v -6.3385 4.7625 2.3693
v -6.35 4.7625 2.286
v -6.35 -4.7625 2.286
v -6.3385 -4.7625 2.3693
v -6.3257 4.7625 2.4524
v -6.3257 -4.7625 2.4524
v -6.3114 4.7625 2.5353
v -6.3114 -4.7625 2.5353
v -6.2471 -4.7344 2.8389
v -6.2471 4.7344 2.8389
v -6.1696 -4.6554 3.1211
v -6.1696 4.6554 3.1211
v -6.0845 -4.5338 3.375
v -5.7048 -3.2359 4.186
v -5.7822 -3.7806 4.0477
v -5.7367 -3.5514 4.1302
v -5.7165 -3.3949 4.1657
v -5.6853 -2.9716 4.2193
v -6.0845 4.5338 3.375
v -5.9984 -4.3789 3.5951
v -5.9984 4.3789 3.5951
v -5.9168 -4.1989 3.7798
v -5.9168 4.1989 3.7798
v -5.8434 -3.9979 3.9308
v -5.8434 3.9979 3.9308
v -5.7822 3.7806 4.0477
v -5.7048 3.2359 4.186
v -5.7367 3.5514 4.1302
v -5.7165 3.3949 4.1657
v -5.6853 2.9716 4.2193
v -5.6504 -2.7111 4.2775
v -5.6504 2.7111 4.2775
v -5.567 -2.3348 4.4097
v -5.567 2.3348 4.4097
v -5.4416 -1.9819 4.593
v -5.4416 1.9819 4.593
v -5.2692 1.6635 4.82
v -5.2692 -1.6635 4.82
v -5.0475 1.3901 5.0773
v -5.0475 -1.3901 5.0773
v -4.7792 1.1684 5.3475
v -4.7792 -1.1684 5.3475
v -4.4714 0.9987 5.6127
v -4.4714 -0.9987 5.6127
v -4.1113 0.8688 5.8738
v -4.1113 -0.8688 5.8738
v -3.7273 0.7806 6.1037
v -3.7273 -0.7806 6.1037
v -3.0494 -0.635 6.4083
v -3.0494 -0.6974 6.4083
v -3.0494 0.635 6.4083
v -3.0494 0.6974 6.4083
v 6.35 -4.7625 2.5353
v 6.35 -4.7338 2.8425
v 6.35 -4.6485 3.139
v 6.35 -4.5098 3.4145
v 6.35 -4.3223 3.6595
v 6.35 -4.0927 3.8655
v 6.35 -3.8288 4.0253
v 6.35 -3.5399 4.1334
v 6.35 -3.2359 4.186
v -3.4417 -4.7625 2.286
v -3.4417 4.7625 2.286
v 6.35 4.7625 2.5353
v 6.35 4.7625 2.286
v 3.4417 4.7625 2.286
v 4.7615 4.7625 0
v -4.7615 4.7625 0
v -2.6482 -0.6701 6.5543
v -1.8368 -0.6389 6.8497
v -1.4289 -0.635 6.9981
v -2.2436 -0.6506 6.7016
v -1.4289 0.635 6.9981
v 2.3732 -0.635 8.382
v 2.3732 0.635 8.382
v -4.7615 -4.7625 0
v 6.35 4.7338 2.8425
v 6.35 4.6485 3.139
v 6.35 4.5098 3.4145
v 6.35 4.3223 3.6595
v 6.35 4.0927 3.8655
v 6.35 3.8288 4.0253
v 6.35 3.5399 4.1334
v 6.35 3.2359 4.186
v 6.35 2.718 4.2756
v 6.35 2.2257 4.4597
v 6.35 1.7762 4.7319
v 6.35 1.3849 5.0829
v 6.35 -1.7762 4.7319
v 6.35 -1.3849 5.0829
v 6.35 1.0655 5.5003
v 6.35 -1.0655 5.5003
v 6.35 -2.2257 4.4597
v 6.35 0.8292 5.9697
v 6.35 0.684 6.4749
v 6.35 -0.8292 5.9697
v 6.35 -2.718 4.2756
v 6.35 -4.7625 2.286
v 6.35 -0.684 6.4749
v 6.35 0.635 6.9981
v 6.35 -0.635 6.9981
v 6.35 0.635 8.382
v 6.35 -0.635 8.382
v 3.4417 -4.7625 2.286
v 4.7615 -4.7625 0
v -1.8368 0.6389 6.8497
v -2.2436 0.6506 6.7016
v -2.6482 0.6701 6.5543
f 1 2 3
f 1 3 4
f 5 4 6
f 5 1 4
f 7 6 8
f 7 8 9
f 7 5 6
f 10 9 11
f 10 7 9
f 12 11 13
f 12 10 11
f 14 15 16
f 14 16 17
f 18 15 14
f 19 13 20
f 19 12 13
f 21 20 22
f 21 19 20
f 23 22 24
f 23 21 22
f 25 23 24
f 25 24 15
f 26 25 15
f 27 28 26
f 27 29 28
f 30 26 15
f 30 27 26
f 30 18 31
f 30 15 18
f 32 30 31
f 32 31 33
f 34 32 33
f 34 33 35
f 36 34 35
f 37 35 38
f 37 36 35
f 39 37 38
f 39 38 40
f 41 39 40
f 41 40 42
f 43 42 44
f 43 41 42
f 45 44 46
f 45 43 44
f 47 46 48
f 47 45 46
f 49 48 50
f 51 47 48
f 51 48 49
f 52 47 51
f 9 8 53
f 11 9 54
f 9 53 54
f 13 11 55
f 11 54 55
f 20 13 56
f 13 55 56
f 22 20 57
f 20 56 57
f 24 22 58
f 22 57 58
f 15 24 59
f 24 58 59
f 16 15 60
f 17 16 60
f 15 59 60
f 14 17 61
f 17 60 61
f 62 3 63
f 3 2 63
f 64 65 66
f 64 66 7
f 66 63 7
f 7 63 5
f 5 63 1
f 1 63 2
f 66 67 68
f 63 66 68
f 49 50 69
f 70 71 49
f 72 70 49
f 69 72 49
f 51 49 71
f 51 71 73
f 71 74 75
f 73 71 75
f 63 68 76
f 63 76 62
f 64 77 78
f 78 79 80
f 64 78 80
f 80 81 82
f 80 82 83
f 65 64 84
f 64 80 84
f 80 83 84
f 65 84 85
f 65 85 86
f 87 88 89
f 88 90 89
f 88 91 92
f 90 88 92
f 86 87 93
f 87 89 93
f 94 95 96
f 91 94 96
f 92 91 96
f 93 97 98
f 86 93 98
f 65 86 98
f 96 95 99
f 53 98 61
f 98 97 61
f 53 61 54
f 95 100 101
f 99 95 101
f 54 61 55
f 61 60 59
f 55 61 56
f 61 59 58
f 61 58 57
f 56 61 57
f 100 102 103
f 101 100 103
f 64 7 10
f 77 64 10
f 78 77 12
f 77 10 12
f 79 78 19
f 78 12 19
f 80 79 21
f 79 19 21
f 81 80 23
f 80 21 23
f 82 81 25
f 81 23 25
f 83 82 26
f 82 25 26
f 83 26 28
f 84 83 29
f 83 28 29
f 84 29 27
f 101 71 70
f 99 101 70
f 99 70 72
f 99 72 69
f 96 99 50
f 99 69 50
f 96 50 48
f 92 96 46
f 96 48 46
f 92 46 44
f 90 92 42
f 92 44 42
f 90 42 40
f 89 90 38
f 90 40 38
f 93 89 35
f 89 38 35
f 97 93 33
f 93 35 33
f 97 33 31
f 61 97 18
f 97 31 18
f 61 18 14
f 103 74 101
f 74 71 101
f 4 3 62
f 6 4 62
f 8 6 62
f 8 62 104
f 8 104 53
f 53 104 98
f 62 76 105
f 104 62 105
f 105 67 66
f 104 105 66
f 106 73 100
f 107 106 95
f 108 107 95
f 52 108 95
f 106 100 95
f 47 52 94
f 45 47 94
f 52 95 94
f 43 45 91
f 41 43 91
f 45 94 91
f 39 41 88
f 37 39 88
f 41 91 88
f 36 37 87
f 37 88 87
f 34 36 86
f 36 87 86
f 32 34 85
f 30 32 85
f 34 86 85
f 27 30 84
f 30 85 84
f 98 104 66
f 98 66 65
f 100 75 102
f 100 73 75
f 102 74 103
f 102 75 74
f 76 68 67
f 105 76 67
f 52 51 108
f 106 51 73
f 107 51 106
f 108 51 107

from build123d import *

# Parameters (mm, degrees)
F0_W         = 9.525
F0_H         = 9.525
F1_DEPTH     = 2.286
F2_T1_DEPTH  = 21.3619144247
F3_W         = 2.9083
F3_H         = 9.525
F3_W_2       = 6.8834
F4_DEPTH     = 1.905
F5_R         = 1.6556676611
F6_W         = 12.7
F6_H         = 1.27
F7_DEPTH     = 4.191
F8_SIZE2     = 8.7232408068
F8_SIZE      = 3.175
F9_T4_DEPTH  = 12.7
F9_T9_DEPTH  = 12.7
F10_T1_DEPTH = 20.1155023365


# Not quite as in the source:
# - a fillet or chamfer that OpenCascade refuses, or shapes differently, is made with other operations: its cross-section is extruded or revolved along the edge and cut away or added


with BuildPart() as f1:
    # F0 (on Top) → F1 (new body)
    with BuildSketch(Plane.XY):
        Rectangle(F0_W, F0_H)
    extrude(amount=F1_DEPTH)

    # F2: chamfer of 1.3208 x 2.2876927066 on 2 edges, made by hand

    # F2_s2 → F2_t1 (cut)
    with BuildSketch(Plane.XZ.offset(-10.6809572123)):
        Polygon((-4.7625, -0.0016927066), (-3.4417, 2.286), (-4.7625, 2.286), align=None)
        Polygon((4.7625, -0.0016927066), (3.4417, 2.286), (4.7625, 2.286), align=None)
    extrude(amount=F2_T1_DEPTH, mode=Mode.SUBTRACT)

    # F3 (on face) → F4 (join)
    with BuildSketch(Plane.XY.offset(2.286)):
        with Locations((4.89585, 0)):
            Rectangle(F3_W, F3_H)
        Rectangle(F3_W_2, F3_H)
        with Locations((-4.89585, 0)):
            Rectangle(F3_W, F3_H)
    extrude(amount=F4_DEPTH)

    # F5
    f5_edges = [f1.edges().sort_by_distance(p)[0] for p in [
        (0, 4.7625, 4.191),
        (0, -4.7625, 4.191),
    ]]
    fillet(f5_edges, radius=F5_R)

    # F6 (on face) → F7 (join)
    with BuildSketch(Plane.XY.offset(4.191)):
        Rectangle(F6_W, F6_H)
    extrude(amount=F7_DEPTH)

    # F8
    f8_edges = [f1.edges().sort_by_distance(p)[0] for p in [
        (-6.35, 0, 8.382),
    ]]
    f8_side = f1.faces().sort_by_distance((-6.35, 0, 3.935532))[0]
    chamfer(f8_edges, length=F8_SIZE, length2=F8_SIZE2, reference=f8_side)

    # F9: fillet of radius 2.8207671263 on 2 edges, made by hand


with BuildPart() as f9_tool2:
    # F9_s3 → F9_t4 (new body)
    with BuildSketch(Plane.YZ.offset(-6.35)):
        with BuildLine():
            ThreePointArc((-0.635, 6.9981468006), (-1.3849039981, 5.0828783899), (-3.235890411, 4.1859623453))
            Line((-3.235890411, 4.1859623453), (-3.2139027394, 3.9047438998))
            ThreePointArc((-3.2139027394, 3.9047438998), (-3.1068323389, 3.9089232874), (-0.635, 3.9089232874))
            Line((-0.635, 3.9089232874), (-0.3529232874, 4.191))
            Line((-0.3529232874, 4.191), (-0.3529232874, 6.9981468006))
            Line((-0.3529232874, 6.9981468006), (-0.635, 6.9981468006))
        make_face()
    extrude(amount=F9_T4_DEPTH)

    split(bisect_by=Plane(origin=(-2.4163064349, 0, 6.6387473684), x_dir=(0, 1, 0), z_dir=(0.3420201433, 0, -0.9396926208)), keep=Keep.TOP)


with BuildPart() as f1_1:
    add(f1.part)

    # F9_t1: union F9_tool2
    add(f9_tool2.part)


with BuildPart() as f9_tool7:
    # F9_s8 → F9_t9 (new body)
    with BuildSketch(Plane.YZ.offset(6.35)):
        with BuildLine():
            ThreePointArc((0.635, 6.9981468006), (1.3849039981, 5.0828783899), (3.235890411, 4.1859623453))
            Line((3.235890411, 4.1859623453), (3.2139027394, 3.9047438998))
            ThreePointArc((3.2139027394, 3.9047438998), (3.1068323389, 3.9089232874), (0.635, 3.9089232874))
            Line((0.635, 3.9089232874), (0.3529232874, 4.191))
            Line((0.3529232874, 4.191), (0.3529232874, 6.9981468006))
            Line((0.3529232874, 6.9981468006), (0.635, 6.9981468006))
        make_face()
    extrude(amount=-F9_T9_DEPTH)

    split(bisect_by=Plane(origin=(-2.4163064349, 0, 6.6387473684), x_dir=(0, 1, 0), z_dir=(0.3420201433, 0, -0.9396926208)), keep=Keep.TOP)


with BuildPart() as f1_2:
    add(f1_1.part)

    # F9_t6: union F9_tool7
    add(f9_tool7.part)

    # F10: fillet of radius 5.08 on 1 edges, made by hand

    # F10_s2 → F10_t1 (cut)
    with BuildSketch(Plane.XZ.offset(-10.0577511683)):
        with BuildLine():
            ThreePointArc((-6.35, 2.286), (-5.2774477357, 4.8097508006), (-3.0493882968, 6.4083244148))
            Line((-3.0493882968, 6.4083244148), (-3.0841375434, 6.5037971851))
            Line((-3.0841375434, 6.5037971851), (-6.3847492466, 5.3024727703))
            Line((-6.3847492466, 5.3024727703), (-6.4516, 5.207))
            ThreePointArc((-6.4516, 5.207), (-6.4516, 3.7465), (-6.4507614806, 2.299026282))
            Line((-6.4507614806, 2.299026282), (-6.35, 2.286))
        make_face()
    extrude(amount=F10_T1_DEPTH, mode=Mode.SUBTRACT)


solid = f1_2.part
